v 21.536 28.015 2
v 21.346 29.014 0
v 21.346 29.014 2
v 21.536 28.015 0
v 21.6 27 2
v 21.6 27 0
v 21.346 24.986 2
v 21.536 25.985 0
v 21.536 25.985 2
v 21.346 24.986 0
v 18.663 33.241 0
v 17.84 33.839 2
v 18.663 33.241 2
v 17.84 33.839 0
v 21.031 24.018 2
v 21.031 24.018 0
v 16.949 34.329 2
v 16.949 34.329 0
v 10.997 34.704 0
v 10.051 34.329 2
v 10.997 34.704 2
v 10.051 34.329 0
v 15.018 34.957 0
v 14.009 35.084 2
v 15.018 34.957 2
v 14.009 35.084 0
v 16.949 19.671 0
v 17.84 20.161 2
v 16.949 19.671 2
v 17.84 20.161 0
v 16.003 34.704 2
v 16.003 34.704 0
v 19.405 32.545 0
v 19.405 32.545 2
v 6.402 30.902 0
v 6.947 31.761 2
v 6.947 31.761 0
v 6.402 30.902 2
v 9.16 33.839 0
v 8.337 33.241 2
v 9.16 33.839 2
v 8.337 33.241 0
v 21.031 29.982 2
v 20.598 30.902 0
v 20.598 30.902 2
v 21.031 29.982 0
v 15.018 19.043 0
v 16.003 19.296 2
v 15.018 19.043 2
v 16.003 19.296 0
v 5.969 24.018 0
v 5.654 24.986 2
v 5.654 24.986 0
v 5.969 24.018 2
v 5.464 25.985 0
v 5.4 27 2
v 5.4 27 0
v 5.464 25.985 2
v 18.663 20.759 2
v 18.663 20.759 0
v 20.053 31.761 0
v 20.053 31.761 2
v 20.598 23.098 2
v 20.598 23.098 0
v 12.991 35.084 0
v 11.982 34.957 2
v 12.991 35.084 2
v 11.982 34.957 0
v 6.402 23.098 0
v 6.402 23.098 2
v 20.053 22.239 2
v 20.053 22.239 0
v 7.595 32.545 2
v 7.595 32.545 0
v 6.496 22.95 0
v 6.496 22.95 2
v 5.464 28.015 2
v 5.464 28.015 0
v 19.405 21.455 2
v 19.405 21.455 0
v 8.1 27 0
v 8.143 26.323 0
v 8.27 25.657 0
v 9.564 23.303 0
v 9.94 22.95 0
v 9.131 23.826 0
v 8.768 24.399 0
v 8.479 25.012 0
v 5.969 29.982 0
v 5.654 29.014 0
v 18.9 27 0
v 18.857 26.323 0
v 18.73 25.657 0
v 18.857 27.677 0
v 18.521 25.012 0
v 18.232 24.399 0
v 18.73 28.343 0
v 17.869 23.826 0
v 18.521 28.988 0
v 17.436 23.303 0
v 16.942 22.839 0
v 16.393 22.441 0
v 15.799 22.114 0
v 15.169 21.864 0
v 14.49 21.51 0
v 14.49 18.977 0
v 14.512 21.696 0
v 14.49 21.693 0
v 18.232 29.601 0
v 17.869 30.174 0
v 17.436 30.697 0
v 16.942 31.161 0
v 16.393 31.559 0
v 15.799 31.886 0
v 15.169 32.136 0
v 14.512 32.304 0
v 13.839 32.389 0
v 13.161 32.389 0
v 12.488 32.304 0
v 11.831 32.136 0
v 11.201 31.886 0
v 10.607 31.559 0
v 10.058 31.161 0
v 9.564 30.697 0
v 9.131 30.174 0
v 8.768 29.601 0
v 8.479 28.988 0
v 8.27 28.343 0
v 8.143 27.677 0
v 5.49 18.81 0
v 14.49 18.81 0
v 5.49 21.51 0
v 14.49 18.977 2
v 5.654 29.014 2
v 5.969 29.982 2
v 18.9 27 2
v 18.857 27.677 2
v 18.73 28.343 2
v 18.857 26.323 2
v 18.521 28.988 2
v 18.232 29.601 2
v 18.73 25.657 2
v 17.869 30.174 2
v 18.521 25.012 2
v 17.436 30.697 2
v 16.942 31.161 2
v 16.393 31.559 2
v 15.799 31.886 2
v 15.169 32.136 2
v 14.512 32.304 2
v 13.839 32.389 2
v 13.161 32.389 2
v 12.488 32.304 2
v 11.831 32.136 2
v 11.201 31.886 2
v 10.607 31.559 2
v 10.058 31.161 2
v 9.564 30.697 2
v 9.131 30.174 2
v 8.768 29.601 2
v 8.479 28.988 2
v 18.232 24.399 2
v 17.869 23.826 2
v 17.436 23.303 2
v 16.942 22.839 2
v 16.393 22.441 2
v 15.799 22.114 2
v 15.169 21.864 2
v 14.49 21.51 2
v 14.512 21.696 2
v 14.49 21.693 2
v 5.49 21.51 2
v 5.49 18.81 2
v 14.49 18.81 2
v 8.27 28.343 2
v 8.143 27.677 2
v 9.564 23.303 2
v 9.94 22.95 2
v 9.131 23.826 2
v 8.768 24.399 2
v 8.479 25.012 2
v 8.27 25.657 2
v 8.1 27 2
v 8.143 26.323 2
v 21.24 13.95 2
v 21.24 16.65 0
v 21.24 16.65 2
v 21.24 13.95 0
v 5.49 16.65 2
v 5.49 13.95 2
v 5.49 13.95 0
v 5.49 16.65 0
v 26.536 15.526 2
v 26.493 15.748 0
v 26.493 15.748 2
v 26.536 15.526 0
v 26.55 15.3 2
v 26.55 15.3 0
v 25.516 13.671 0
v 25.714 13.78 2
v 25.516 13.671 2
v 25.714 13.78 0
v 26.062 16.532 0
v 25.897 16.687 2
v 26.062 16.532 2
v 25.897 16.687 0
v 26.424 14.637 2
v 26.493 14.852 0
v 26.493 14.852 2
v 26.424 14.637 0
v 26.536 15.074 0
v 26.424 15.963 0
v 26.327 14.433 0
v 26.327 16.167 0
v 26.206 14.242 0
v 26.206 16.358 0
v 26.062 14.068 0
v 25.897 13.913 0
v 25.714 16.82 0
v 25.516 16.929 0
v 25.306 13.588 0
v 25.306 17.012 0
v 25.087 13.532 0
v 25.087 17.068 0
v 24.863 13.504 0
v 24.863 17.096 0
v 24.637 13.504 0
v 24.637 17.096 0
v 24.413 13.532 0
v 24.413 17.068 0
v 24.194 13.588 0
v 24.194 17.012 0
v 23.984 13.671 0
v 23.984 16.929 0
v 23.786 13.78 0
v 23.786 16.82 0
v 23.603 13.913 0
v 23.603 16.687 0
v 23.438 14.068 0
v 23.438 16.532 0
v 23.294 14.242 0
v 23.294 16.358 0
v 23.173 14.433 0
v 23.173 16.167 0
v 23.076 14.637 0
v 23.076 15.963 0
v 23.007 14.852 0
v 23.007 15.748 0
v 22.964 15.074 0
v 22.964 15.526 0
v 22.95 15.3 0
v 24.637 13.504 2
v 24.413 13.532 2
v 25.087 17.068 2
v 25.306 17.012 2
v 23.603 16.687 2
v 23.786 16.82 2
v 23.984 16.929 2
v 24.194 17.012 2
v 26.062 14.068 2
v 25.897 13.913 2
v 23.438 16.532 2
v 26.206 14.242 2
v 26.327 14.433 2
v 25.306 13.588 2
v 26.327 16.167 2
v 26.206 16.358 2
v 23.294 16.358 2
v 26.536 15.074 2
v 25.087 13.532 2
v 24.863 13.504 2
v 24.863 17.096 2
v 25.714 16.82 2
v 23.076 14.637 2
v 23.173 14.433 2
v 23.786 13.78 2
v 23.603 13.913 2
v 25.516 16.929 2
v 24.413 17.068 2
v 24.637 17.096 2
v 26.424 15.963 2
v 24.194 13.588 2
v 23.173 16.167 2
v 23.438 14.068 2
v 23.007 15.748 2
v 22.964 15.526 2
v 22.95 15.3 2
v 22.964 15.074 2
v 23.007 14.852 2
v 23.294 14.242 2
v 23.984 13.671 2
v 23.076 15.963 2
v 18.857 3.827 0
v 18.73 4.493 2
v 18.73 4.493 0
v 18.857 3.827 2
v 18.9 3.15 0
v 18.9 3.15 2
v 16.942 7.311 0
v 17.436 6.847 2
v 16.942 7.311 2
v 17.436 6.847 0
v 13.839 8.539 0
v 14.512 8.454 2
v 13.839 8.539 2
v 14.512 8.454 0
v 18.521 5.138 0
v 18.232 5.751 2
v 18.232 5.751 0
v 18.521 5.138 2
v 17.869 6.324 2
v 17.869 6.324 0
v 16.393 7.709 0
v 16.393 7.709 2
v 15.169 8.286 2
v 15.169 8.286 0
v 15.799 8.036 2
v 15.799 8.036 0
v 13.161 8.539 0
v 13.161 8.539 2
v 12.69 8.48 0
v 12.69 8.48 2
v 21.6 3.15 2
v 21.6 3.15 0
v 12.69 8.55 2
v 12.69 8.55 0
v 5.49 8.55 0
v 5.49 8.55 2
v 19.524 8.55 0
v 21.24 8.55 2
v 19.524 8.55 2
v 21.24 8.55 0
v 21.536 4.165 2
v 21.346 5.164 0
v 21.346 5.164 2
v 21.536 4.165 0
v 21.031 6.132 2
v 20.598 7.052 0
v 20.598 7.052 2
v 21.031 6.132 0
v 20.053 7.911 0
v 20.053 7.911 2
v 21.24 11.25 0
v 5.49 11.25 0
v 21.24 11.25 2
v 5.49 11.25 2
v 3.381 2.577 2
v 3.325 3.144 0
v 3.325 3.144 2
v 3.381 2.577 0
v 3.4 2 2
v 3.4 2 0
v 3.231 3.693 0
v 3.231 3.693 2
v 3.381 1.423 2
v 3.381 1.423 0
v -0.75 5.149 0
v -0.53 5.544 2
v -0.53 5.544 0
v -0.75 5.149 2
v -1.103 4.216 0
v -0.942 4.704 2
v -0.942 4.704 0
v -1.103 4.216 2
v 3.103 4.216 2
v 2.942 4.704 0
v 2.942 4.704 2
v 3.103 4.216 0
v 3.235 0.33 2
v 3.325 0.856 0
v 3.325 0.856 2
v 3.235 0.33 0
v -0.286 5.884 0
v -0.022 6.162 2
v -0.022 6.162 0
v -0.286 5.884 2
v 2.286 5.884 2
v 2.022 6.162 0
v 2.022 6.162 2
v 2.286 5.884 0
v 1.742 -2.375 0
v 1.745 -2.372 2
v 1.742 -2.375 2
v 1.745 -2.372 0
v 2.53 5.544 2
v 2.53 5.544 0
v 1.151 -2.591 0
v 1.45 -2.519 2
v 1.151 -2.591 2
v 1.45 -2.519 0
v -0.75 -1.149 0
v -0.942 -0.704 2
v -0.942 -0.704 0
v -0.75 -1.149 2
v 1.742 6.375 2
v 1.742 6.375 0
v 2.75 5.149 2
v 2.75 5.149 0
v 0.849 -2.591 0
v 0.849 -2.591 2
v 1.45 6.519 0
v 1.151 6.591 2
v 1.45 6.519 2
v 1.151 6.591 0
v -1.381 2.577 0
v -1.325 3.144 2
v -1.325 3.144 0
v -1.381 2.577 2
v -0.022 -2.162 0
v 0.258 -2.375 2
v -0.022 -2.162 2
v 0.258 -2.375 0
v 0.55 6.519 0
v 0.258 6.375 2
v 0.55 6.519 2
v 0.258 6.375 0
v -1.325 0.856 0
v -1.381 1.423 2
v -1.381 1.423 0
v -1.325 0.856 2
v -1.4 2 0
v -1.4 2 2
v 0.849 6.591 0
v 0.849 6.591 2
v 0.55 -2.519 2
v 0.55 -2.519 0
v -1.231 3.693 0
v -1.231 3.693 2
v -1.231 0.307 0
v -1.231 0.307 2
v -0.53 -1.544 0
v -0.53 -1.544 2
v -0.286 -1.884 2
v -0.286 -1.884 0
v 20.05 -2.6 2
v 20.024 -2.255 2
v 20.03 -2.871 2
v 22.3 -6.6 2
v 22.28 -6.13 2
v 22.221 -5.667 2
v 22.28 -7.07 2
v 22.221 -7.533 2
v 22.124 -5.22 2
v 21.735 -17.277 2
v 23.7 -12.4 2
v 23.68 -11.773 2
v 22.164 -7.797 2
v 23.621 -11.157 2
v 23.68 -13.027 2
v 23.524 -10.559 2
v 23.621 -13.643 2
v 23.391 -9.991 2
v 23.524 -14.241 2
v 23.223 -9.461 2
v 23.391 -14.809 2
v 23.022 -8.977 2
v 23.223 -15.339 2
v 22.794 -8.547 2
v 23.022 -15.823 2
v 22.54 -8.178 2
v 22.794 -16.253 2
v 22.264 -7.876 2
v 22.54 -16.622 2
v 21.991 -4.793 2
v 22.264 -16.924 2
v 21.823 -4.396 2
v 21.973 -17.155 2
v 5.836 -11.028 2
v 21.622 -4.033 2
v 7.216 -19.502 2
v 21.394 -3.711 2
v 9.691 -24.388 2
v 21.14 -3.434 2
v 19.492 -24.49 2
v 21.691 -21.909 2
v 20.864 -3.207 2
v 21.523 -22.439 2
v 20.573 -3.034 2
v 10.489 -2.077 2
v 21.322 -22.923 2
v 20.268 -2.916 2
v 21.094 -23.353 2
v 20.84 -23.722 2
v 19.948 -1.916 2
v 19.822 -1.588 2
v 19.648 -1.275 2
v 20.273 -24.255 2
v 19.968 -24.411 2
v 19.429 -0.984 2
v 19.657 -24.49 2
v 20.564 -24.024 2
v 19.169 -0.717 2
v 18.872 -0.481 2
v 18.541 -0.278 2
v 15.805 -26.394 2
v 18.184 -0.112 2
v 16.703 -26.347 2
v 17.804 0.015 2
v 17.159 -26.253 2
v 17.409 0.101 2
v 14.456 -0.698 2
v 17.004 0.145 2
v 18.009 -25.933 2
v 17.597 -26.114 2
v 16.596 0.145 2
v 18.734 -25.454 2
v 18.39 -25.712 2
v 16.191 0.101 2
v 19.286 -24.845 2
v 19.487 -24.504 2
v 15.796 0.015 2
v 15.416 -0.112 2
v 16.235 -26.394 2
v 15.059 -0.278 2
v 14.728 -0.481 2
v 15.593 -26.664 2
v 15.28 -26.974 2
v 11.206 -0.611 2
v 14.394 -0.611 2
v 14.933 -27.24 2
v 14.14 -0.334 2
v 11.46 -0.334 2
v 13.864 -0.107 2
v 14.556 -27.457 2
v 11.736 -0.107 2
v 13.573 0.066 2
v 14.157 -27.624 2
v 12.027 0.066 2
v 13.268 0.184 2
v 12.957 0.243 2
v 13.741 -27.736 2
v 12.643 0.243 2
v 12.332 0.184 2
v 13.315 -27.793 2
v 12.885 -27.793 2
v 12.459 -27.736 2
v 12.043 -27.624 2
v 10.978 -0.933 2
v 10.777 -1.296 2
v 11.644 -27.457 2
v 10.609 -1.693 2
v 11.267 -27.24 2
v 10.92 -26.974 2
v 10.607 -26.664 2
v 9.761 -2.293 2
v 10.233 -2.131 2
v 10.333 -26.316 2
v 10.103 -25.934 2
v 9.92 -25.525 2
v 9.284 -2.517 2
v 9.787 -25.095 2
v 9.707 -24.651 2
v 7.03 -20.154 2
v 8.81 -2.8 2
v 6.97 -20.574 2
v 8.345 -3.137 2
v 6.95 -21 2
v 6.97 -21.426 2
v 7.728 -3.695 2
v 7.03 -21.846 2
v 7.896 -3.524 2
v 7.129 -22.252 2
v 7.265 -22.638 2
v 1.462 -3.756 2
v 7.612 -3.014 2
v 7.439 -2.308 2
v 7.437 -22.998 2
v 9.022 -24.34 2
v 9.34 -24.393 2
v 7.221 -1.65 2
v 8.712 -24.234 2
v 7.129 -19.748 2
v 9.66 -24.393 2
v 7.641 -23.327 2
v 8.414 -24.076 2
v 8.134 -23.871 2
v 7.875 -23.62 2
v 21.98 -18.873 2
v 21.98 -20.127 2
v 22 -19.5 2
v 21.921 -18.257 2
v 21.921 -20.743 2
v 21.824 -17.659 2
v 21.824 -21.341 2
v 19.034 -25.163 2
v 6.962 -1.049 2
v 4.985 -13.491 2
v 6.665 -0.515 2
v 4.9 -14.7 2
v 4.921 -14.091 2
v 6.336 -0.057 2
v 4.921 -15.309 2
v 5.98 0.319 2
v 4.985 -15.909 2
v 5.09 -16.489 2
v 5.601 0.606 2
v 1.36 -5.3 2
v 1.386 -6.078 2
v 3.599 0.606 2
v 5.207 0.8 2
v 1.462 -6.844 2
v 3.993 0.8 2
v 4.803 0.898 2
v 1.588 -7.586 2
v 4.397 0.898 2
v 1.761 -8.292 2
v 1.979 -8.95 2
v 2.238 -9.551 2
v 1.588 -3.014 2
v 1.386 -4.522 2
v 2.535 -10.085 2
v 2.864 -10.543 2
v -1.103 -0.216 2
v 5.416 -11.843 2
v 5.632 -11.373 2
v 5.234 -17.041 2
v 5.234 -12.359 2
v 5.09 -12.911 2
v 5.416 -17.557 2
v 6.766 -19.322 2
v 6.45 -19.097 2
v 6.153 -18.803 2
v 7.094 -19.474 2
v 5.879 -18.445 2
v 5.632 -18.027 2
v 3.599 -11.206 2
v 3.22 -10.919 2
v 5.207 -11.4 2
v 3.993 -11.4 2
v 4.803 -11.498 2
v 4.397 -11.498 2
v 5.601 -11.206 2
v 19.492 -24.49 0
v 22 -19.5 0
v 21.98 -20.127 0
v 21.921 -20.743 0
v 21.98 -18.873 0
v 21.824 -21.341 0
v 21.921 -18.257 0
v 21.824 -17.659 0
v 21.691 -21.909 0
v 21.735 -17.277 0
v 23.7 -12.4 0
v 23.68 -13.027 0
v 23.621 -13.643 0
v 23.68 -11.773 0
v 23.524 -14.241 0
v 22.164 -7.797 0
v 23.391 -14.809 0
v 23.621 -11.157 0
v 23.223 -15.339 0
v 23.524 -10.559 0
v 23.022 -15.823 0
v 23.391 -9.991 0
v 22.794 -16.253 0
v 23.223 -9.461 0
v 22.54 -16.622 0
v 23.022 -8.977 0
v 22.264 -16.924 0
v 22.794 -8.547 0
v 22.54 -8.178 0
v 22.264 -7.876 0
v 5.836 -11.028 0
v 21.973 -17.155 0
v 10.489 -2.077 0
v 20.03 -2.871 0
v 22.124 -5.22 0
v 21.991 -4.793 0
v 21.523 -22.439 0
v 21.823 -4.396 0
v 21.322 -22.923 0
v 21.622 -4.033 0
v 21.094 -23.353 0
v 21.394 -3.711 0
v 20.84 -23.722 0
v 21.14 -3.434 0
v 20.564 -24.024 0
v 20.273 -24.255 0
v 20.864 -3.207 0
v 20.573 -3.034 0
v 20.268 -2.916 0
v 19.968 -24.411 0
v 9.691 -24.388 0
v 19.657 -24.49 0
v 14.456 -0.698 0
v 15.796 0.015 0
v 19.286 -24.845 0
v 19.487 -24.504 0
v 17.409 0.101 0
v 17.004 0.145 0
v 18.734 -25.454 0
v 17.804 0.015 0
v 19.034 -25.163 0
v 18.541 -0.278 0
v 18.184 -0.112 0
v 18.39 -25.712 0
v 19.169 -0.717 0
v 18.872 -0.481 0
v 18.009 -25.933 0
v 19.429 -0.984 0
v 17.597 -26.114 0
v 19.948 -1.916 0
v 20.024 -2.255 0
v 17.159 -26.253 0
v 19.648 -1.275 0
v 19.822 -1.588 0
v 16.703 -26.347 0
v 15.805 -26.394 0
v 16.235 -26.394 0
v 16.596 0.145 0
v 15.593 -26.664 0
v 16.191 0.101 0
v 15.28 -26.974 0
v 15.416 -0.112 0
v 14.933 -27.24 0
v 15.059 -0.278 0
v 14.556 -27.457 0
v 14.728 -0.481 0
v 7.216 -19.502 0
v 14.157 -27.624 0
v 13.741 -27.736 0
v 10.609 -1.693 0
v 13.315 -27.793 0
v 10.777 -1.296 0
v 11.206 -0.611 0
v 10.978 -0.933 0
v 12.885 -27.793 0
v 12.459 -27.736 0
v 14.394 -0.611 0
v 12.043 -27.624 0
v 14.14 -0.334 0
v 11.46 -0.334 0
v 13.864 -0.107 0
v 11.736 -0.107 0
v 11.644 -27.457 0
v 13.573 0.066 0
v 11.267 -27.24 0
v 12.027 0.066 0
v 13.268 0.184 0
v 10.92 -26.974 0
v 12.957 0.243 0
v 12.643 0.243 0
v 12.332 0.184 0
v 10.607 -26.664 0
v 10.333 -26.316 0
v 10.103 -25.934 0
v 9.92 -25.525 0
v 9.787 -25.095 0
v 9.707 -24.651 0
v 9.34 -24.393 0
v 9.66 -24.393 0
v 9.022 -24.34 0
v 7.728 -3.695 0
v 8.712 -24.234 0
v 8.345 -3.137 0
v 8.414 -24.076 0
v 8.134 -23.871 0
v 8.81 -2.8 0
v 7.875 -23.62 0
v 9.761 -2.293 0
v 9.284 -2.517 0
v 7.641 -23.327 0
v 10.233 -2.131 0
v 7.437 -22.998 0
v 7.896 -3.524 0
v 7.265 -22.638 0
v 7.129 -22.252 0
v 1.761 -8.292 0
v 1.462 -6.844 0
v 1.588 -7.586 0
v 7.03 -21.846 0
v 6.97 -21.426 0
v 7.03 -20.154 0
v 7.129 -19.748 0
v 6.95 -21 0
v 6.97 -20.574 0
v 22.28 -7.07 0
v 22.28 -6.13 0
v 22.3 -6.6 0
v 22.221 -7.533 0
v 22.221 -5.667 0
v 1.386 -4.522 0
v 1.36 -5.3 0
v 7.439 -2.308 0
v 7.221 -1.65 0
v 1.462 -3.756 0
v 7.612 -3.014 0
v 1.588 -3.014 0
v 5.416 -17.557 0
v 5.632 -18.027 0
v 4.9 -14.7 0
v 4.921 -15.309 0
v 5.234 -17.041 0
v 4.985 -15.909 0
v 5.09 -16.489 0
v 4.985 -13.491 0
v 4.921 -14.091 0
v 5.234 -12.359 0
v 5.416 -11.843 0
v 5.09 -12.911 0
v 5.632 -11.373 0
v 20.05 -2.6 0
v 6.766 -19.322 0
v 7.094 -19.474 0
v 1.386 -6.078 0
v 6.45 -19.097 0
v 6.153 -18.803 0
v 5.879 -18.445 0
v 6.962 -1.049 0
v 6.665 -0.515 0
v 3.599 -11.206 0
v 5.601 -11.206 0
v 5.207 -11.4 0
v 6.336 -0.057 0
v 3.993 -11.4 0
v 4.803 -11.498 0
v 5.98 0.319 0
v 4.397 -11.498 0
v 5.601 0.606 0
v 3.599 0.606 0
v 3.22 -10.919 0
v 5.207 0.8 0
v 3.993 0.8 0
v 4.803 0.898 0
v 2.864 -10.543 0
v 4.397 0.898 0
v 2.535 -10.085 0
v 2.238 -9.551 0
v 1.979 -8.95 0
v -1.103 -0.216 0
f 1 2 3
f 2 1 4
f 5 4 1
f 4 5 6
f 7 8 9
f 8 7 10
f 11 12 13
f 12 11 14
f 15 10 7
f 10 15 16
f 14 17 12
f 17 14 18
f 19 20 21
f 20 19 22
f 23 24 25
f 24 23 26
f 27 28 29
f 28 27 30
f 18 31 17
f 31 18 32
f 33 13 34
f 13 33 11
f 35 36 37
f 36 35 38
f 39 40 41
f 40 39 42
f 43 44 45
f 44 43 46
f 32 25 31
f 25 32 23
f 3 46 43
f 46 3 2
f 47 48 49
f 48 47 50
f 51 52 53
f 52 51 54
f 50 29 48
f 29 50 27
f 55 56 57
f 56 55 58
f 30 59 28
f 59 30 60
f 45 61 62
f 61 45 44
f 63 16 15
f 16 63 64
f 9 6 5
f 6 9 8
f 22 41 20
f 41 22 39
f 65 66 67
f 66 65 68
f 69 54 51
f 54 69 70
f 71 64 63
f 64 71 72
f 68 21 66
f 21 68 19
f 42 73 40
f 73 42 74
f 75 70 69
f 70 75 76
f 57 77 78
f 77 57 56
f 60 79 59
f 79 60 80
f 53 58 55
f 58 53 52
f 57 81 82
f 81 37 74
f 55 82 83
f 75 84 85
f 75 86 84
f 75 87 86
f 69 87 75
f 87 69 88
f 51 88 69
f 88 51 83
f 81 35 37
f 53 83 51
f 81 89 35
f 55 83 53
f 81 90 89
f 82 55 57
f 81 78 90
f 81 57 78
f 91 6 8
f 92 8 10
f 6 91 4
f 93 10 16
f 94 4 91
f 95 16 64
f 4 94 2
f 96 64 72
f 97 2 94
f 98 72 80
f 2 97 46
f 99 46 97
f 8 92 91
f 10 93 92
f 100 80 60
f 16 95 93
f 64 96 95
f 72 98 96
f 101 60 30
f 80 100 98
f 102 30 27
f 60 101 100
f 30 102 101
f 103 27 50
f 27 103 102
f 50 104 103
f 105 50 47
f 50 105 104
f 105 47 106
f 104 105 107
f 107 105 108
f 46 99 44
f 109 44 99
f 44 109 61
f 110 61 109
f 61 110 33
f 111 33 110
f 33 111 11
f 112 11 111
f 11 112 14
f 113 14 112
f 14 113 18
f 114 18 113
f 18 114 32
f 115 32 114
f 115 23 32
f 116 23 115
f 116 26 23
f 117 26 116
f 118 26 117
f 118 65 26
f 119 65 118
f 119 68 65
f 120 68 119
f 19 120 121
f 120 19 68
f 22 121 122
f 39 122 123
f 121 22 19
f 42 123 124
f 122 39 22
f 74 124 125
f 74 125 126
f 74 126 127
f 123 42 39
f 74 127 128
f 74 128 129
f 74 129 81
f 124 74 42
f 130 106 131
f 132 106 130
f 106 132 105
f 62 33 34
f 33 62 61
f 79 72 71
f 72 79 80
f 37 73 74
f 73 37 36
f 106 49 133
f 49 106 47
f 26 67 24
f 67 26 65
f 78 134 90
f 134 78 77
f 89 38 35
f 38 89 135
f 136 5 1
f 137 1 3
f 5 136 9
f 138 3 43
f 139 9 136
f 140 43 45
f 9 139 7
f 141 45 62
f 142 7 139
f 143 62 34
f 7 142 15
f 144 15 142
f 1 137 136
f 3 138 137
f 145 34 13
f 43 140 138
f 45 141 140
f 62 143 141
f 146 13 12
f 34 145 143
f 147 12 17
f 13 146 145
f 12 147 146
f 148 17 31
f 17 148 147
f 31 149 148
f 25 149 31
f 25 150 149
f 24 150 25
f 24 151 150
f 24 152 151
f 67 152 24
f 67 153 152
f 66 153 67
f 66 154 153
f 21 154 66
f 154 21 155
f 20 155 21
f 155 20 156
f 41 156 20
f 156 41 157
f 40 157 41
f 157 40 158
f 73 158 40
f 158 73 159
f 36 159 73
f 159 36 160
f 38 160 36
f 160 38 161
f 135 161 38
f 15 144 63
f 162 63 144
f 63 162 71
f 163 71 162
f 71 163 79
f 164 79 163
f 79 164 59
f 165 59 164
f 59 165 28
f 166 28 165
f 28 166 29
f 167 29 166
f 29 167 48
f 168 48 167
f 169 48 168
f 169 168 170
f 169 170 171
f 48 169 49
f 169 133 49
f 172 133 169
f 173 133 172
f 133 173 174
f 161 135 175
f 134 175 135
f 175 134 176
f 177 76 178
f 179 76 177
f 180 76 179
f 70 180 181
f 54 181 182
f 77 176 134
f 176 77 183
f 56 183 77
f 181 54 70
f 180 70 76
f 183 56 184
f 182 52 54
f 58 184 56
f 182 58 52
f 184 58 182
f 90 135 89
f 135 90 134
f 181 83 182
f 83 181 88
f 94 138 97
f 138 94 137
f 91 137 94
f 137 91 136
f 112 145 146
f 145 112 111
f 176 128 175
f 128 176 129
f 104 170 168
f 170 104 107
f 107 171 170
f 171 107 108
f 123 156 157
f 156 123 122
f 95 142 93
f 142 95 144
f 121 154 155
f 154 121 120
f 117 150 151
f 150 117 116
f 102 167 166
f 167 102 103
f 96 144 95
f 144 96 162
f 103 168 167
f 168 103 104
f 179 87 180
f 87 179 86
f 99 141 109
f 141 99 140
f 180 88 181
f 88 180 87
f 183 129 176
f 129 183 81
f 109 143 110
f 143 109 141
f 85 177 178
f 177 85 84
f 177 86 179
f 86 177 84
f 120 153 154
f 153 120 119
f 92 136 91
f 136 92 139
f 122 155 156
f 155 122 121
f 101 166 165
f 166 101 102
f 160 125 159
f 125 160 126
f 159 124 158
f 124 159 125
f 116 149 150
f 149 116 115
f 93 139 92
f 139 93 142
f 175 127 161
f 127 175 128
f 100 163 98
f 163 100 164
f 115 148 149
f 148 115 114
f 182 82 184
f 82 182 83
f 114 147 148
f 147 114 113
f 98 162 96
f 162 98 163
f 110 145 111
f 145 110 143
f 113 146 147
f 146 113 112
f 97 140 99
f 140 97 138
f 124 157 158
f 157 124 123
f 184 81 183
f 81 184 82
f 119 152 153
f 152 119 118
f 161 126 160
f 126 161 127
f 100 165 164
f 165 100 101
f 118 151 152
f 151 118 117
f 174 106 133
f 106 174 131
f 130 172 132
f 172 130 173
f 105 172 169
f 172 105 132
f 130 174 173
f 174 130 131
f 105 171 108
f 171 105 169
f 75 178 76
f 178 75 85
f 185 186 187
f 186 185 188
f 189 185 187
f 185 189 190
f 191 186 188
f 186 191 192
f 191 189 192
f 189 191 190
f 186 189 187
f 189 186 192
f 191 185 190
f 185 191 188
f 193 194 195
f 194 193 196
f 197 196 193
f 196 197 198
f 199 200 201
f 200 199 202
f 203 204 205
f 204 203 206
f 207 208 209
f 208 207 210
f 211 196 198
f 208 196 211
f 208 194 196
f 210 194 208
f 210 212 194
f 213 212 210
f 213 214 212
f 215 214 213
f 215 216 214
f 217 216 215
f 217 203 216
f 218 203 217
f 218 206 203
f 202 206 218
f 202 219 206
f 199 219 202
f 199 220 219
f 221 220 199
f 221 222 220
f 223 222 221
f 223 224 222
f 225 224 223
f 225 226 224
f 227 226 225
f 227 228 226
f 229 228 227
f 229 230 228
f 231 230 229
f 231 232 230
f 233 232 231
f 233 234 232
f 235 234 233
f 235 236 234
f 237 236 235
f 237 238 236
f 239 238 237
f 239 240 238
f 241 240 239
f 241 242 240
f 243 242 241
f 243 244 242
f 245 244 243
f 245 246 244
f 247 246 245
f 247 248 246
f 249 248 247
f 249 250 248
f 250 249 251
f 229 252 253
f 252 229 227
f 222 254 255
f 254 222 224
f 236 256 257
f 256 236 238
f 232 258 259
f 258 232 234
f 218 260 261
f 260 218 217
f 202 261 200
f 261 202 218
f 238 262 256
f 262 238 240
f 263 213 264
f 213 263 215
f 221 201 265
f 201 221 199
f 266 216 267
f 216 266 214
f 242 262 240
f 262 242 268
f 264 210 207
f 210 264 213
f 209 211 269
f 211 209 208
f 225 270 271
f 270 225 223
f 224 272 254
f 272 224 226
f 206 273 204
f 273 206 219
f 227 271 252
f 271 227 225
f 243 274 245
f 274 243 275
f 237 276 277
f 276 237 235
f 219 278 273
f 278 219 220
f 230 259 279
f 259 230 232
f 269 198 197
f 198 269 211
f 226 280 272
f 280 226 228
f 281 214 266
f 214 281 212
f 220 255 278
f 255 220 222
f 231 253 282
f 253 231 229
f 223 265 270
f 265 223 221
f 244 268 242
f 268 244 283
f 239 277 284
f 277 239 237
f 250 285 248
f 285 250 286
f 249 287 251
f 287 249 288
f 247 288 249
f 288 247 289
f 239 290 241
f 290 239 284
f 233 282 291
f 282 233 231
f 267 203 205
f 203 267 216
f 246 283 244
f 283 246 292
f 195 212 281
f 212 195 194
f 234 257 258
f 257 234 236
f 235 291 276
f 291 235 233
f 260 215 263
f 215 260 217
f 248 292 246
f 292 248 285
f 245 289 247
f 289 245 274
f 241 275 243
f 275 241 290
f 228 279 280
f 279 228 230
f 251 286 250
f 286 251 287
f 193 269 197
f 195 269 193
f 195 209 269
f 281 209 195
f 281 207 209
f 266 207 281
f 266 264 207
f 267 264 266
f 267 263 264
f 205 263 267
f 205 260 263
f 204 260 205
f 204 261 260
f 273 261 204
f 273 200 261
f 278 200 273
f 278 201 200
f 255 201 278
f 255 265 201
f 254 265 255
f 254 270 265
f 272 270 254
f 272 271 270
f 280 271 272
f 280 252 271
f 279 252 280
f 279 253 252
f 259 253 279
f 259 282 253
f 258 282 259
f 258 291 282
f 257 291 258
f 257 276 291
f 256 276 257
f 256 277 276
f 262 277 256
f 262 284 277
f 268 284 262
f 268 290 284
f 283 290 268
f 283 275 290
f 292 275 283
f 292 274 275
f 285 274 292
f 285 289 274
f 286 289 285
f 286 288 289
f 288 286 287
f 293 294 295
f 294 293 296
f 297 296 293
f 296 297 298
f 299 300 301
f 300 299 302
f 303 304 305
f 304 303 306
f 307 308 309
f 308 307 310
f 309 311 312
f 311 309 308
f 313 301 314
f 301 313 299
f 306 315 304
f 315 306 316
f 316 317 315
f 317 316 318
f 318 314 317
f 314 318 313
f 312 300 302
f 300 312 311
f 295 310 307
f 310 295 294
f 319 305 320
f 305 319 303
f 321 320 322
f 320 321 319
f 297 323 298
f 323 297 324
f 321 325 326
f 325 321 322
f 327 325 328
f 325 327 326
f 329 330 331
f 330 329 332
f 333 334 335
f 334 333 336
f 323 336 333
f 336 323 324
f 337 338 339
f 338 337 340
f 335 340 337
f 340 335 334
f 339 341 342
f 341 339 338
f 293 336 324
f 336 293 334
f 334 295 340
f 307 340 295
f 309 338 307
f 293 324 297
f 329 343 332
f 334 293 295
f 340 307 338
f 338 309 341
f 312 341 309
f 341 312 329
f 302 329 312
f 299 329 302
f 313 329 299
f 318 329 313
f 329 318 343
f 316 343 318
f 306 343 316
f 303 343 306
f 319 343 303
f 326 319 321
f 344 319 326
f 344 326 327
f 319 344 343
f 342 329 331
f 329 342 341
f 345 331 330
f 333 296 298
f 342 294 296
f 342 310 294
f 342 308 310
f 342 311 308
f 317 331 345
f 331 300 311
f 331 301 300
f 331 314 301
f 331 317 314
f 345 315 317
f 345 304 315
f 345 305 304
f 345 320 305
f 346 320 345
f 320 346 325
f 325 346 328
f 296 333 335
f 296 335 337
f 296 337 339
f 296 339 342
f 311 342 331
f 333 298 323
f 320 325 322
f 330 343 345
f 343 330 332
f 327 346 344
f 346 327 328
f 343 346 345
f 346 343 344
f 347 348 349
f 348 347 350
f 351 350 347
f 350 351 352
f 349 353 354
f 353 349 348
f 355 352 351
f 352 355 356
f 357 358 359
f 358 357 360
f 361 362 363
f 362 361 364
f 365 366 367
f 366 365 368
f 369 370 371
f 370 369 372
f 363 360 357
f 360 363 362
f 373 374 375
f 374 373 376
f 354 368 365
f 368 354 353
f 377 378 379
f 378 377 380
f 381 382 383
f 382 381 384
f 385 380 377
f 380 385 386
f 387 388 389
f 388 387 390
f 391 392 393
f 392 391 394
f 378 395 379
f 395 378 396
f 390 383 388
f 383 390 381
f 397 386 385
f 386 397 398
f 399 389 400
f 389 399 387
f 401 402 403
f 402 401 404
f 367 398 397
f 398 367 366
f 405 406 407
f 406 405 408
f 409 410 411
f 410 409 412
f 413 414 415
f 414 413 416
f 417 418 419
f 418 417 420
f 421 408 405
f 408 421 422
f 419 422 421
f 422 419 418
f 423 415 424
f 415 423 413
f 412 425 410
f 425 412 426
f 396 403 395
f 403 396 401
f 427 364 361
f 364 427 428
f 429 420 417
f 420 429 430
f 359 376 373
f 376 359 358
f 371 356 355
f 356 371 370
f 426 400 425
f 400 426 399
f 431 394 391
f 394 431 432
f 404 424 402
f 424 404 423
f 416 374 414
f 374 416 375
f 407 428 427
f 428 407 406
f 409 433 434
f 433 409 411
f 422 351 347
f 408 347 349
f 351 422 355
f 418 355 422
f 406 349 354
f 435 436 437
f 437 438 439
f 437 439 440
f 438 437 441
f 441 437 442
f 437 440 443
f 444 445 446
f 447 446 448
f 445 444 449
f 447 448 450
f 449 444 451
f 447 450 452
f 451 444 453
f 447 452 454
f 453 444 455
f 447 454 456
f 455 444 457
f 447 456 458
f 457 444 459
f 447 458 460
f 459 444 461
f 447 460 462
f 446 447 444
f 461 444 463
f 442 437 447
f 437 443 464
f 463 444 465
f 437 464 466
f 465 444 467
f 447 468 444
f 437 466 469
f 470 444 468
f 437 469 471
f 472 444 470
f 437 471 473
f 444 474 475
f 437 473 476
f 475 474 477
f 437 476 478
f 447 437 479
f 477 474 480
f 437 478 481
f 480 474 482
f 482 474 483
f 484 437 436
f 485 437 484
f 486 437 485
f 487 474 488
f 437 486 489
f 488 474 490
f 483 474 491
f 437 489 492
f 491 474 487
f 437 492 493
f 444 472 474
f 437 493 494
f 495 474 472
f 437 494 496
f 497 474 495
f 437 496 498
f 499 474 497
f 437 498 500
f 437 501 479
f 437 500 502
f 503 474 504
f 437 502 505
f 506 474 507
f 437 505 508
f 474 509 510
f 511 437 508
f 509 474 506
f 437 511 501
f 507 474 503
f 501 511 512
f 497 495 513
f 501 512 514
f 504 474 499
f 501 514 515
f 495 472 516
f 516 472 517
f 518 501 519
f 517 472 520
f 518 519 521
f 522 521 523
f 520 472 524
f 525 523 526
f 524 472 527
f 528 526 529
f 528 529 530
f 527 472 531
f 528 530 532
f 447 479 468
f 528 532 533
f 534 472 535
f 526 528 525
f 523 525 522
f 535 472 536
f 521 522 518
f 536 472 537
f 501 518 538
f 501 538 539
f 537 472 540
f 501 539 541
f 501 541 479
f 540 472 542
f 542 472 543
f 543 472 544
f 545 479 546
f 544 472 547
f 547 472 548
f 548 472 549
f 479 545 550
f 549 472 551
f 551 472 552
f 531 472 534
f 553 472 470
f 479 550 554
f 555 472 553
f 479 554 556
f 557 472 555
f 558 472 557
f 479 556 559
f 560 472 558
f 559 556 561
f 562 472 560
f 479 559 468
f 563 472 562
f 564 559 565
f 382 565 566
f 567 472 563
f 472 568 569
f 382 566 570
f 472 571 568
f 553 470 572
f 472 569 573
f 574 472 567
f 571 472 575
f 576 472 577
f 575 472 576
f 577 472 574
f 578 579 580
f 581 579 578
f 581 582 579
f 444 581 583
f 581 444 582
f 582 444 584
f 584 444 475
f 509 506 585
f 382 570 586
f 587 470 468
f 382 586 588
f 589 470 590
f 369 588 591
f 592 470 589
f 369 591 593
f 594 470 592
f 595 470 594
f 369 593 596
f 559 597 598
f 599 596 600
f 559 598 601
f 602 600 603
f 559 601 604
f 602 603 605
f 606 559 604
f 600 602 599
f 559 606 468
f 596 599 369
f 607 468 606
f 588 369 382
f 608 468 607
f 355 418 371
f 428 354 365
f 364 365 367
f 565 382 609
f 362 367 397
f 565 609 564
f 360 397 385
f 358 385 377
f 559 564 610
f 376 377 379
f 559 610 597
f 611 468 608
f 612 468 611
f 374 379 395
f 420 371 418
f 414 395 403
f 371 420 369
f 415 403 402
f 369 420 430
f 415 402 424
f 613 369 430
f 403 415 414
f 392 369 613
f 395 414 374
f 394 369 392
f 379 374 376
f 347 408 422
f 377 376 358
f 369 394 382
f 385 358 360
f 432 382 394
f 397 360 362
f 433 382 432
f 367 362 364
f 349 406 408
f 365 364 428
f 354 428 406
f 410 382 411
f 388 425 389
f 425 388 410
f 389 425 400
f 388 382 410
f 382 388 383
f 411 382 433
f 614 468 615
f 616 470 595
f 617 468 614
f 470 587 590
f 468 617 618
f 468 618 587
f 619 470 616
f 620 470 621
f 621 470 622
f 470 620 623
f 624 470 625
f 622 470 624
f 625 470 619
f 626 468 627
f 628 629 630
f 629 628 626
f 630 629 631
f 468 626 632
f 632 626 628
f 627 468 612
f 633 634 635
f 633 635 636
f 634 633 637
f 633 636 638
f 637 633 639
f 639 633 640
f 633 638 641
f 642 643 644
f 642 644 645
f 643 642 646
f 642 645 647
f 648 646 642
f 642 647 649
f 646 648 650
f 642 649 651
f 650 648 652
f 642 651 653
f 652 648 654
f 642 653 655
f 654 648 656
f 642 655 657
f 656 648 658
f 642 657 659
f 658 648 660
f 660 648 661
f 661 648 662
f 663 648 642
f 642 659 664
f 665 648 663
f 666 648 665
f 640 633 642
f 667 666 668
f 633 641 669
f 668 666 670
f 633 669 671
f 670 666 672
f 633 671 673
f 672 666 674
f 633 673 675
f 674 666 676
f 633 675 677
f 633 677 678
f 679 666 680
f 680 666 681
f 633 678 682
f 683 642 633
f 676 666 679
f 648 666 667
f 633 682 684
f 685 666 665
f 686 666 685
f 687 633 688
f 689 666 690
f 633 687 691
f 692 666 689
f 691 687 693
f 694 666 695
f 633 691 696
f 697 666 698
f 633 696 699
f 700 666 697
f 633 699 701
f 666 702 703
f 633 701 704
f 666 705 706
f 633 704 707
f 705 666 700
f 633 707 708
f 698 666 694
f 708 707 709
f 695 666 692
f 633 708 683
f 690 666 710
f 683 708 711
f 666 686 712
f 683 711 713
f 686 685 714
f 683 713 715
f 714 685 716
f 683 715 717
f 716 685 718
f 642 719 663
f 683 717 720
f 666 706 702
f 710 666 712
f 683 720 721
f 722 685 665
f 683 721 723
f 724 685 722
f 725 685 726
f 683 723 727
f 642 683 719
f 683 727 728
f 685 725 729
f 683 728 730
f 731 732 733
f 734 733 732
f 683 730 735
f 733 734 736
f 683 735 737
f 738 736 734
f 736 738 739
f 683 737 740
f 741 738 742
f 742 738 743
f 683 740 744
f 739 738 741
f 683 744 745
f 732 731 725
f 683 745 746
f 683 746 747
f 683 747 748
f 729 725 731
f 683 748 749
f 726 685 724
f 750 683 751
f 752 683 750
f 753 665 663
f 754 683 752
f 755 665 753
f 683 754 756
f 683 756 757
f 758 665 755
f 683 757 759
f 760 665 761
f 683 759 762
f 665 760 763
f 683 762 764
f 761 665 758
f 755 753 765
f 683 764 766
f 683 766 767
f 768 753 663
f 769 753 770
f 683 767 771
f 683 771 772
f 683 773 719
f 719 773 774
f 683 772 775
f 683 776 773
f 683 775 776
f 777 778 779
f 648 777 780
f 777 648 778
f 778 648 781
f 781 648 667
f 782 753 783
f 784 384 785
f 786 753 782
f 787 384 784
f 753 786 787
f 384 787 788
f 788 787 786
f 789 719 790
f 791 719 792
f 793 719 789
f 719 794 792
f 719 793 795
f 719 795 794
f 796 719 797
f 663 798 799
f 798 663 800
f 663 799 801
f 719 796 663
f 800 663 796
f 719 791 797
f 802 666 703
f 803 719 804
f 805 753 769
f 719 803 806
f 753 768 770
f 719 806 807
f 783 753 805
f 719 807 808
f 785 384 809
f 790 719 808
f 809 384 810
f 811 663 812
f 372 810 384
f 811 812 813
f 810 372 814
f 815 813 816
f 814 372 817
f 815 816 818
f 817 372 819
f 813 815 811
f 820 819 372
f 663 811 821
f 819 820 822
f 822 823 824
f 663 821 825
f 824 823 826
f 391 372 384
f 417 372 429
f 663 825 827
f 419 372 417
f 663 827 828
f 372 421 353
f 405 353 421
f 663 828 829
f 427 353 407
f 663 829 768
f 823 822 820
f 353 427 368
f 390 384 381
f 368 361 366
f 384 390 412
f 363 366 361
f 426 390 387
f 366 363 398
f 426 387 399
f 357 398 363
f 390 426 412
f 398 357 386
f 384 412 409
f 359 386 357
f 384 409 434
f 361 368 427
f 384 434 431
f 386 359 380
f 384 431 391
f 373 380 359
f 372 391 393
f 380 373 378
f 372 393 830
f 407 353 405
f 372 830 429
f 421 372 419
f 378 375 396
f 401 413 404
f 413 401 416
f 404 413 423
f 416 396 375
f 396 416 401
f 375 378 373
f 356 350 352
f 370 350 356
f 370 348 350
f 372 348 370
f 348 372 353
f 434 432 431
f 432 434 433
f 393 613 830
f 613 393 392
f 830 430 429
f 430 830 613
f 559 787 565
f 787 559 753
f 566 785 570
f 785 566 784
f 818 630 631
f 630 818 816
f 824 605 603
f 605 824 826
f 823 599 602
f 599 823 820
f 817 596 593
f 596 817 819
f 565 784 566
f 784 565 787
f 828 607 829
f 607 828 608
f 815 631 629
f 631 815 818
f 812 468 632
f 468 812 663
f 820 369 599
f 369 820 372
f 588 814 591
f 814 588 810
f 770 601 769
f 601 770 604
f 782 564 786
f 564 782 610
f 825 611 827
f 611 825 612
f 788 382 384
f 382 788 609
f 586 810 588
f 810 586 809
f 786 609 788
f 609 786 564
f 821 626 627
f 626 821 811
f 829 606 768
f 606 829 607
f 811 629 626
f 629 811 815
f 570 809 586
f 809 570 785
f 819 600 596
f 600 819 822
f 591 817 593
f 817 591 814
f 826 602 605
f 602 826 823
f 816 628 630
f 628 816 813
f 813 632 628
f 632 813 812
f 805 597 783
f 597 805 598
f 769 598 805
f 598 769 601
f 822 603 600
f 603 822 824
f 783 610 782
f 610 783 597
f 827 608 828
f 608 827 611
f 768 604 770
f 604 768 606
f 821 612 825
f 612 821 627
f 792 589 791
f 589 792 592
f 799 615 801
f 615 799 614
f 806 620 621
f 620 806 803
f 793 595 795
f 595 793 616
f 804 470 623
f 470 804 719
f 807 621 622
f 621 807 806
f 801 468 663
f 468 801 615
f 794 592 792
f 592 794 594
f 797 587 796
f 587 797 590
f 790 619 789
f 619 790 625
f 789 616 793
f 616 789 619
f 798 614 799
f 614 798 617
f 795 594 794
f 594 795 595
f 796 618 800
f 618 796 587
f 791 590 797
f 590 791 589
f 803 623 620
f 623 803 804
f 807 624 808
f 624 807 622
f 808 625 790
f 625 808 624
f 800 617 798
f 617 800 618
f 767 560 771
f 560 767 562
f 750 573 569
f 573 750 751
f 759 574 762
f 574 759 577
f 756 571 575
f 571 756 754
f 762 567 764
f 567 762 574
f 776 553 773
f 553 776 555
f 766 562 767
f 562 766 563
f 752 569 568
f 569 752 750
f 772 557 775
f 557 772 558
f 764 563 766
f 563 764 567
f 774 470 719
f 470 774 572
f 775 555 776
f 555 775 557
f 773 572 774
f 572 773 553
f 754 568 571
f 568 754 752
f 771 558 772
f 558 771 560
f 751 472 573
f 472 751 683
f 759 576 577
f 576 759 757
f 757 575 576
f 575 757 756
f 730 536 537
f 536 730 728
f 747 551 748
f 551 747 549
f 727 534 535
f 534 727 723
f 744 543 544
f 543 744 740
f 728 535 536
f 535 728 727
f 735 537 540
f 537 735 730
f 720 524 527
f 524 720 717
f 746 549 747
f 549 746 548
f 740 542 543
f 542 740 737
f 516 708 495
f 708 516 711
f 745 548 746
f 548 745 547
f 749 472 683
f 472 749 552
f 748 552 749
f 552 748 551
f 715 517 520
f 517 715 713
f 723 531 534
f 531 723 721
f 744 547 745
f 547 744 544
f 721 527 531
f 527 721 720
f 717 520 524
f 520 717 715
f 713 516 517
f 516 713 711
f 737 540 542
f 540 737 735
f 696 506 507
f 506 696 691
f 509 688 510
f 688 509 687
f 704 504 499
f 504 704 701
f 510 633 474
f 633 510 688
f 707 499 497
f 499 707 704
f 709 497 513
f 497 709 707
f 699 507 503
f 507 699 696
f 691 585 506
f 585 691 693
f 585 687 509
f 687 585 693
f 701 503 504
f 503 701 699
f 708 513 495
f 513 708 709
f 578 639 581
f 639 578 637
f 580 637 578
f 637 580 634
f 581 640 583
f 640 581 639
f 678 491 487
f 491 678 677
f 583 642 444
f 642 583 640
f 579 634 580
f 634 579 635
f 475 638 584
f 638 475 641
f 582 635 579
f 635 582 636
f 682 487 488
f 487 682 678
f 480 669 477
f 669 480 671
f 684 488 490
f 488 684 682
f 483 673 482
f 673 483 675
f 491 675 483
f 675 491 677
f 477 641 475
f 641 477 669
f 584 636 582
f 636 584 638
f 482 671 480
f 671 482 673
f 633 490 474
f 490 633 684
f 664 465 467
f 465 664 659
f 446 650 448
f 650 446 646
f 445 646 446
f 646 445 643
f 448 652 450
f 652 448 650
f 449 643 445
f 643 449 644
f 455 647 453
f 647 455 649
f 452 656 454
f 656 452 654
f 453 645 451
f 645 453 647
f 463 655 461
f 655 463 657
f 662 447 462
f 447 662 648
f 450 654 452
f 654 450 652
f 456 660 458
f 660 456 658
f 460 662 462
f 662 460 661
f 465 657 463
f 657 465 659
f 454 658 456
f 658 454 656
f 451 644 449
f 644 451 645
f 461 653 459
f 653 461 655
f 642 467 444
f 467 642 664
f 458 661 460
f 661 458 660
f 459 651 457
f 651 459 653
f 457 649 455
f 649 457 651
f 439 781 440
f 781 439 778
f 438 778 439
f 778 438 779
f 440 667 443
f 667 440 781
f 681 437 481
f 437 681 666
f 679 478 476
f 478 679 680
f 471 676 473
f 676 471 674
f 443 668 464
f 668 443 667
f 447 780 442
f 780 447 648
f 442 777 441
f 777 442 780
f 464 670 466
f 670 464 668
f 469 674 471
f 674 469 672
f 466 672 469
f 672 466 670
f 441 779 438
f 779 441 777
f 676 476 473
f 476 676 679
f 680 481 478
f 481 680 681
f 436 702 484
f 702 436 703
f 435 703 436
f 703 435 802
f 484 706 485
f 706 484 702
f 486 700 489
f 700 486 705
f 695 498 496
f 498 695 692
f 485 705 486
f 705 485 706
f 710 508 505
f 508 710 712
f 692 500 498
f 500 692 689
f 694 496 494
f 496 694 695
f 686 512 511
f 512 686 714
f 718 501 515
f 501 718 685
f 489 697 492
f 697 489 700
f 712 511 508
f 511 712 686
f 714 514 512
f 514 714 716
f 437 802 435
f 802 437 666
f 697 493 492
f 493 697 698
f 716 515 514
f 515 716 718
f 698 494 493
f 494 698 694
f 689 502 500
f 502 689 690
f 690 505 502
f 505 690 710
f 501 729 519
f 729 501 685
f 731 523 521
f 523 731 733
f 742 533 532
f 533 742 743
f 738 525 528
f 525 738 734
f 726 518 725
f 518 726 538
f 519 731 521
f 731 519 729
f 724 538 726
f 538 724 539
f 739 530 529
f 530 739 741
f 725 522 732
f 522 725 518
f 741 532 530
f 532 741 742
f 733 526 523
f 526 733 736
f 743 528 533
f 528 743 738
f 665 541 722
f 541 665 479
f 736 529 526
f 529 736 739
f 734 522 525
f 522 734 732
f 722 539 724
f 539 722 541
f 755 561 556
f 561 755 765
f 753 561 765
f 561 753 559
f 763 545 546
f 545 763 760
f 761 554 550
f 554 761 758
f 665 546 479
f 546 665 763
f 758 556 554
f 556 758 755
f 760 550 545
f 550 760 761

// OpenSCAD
espessura=2;

logo();

module logo()
{
	scale(0.9,0.9,1) air();
	translate([0,2,0]) nuvem();
}

module air()
{
	//LETRA A
	difference()
	{
		union()
		{
			difference()
			{
				translate([15,30,0]) cylinder(espessura+0.222,9.0,9.0,$fn=50);
				translate([15,30,-1]) cylinder(espessura+2,6.0,6.0,$fn=50);		
			}
			translate([6.1,20.9,0]) cube([10,3,espessura+0.222]);	
		}
		translate([6.1,23.9,-1]) cube([10,1.6,espessura+2]);
	}

	//LETRA I
	union()
	{
		translate([6.1,15.5,0]) cube([17.5,3,espessura+0.222]);
		translate([27.5,17.0,0]) cylinder(espessura+0.222,2.0,2.0,$fn=50);
	}

	//LETRA R
	union()
	{
		translate([6.1,9.5,0]) cube([17.5,3,espessura+0.222]);
		difference()
		{
			translate([15,3.5,0]) cylinder(espessura+0.222,9.0,9.0,$fn=50);
			union()
			{
				translate([15,3.5,-1]) cylinder(espessura+2,6.0,6.0,$fn=50);
				translate([5.1,-6.5,-1]) cube([20,10,espessura+2]);	
				translate([5.1,0,-1]) cube([9,9.5,espessura+2]);	
			}
		}
	}
}

module nuvem()
{
	translate([1,0,0]) scale([1.2,2.3,1.0]) cylinder(espessura,2.0,2.0,$fn=50);

	translate([4.6,-7.3,0]) scale([1.2,2.3,1.0]) cylinder(espessura,2.7,2.7,$fn=50);

	translate([7.6,-16.7,0]) scale([1.0,1.8,1.0]) cylinder(espessura,2.7,2.7,$fn=50);
	translate([9.5,-23.0,0]) scale([1.5,2.0,1.0]) cylinder(espessura,1.7,1.7,$fn=50);
	translate([13.1,-26.2,0]) scale([1.9,2.0,1.0]) cylinder(espessura,1.8,1.8,$fn=50);
	translate([16,-25.4,0]) scale([2.5,2.0,1.0]) cylinder(espessura,1.5,1.5,$fn=50);
	translate([19.5,-21.5,0]) scale([1.0,2.0,1.0]) cylinder(espessura,2.5,2.5,$fn=50);
	translate([21.2,-14.4,0]) scale([1.0,2.0,1.0]) cylinder(espessura,2.5,2.5,$fn=50);
	translate([19.8,-8.6,0]) scale([1.0,1.5,1.0]) cylinder(espessura,2.5,2.5,$fn=50);
	translate([16.8,-4.6,0]) scale([1.3,1.1,1.0]) cylinder(espessura,2.5,2.5,$fn=50);
	translate([12.8,-5.5,0]) scale([1.0,1.5,1.0]) cylinder(espessura,2.5,2.5,$fn=50);
	rotate(-38) translate([12.5,-0.7,0]) scale([1.1,1.8,1.0]) cylinder(espessura,2.7,2.7,$fn=50);

	translate([14.1,-15.6,0]) scale([3,4,1.0]) cylinder(espessura,2.7,2.7,$fn=50);
}
